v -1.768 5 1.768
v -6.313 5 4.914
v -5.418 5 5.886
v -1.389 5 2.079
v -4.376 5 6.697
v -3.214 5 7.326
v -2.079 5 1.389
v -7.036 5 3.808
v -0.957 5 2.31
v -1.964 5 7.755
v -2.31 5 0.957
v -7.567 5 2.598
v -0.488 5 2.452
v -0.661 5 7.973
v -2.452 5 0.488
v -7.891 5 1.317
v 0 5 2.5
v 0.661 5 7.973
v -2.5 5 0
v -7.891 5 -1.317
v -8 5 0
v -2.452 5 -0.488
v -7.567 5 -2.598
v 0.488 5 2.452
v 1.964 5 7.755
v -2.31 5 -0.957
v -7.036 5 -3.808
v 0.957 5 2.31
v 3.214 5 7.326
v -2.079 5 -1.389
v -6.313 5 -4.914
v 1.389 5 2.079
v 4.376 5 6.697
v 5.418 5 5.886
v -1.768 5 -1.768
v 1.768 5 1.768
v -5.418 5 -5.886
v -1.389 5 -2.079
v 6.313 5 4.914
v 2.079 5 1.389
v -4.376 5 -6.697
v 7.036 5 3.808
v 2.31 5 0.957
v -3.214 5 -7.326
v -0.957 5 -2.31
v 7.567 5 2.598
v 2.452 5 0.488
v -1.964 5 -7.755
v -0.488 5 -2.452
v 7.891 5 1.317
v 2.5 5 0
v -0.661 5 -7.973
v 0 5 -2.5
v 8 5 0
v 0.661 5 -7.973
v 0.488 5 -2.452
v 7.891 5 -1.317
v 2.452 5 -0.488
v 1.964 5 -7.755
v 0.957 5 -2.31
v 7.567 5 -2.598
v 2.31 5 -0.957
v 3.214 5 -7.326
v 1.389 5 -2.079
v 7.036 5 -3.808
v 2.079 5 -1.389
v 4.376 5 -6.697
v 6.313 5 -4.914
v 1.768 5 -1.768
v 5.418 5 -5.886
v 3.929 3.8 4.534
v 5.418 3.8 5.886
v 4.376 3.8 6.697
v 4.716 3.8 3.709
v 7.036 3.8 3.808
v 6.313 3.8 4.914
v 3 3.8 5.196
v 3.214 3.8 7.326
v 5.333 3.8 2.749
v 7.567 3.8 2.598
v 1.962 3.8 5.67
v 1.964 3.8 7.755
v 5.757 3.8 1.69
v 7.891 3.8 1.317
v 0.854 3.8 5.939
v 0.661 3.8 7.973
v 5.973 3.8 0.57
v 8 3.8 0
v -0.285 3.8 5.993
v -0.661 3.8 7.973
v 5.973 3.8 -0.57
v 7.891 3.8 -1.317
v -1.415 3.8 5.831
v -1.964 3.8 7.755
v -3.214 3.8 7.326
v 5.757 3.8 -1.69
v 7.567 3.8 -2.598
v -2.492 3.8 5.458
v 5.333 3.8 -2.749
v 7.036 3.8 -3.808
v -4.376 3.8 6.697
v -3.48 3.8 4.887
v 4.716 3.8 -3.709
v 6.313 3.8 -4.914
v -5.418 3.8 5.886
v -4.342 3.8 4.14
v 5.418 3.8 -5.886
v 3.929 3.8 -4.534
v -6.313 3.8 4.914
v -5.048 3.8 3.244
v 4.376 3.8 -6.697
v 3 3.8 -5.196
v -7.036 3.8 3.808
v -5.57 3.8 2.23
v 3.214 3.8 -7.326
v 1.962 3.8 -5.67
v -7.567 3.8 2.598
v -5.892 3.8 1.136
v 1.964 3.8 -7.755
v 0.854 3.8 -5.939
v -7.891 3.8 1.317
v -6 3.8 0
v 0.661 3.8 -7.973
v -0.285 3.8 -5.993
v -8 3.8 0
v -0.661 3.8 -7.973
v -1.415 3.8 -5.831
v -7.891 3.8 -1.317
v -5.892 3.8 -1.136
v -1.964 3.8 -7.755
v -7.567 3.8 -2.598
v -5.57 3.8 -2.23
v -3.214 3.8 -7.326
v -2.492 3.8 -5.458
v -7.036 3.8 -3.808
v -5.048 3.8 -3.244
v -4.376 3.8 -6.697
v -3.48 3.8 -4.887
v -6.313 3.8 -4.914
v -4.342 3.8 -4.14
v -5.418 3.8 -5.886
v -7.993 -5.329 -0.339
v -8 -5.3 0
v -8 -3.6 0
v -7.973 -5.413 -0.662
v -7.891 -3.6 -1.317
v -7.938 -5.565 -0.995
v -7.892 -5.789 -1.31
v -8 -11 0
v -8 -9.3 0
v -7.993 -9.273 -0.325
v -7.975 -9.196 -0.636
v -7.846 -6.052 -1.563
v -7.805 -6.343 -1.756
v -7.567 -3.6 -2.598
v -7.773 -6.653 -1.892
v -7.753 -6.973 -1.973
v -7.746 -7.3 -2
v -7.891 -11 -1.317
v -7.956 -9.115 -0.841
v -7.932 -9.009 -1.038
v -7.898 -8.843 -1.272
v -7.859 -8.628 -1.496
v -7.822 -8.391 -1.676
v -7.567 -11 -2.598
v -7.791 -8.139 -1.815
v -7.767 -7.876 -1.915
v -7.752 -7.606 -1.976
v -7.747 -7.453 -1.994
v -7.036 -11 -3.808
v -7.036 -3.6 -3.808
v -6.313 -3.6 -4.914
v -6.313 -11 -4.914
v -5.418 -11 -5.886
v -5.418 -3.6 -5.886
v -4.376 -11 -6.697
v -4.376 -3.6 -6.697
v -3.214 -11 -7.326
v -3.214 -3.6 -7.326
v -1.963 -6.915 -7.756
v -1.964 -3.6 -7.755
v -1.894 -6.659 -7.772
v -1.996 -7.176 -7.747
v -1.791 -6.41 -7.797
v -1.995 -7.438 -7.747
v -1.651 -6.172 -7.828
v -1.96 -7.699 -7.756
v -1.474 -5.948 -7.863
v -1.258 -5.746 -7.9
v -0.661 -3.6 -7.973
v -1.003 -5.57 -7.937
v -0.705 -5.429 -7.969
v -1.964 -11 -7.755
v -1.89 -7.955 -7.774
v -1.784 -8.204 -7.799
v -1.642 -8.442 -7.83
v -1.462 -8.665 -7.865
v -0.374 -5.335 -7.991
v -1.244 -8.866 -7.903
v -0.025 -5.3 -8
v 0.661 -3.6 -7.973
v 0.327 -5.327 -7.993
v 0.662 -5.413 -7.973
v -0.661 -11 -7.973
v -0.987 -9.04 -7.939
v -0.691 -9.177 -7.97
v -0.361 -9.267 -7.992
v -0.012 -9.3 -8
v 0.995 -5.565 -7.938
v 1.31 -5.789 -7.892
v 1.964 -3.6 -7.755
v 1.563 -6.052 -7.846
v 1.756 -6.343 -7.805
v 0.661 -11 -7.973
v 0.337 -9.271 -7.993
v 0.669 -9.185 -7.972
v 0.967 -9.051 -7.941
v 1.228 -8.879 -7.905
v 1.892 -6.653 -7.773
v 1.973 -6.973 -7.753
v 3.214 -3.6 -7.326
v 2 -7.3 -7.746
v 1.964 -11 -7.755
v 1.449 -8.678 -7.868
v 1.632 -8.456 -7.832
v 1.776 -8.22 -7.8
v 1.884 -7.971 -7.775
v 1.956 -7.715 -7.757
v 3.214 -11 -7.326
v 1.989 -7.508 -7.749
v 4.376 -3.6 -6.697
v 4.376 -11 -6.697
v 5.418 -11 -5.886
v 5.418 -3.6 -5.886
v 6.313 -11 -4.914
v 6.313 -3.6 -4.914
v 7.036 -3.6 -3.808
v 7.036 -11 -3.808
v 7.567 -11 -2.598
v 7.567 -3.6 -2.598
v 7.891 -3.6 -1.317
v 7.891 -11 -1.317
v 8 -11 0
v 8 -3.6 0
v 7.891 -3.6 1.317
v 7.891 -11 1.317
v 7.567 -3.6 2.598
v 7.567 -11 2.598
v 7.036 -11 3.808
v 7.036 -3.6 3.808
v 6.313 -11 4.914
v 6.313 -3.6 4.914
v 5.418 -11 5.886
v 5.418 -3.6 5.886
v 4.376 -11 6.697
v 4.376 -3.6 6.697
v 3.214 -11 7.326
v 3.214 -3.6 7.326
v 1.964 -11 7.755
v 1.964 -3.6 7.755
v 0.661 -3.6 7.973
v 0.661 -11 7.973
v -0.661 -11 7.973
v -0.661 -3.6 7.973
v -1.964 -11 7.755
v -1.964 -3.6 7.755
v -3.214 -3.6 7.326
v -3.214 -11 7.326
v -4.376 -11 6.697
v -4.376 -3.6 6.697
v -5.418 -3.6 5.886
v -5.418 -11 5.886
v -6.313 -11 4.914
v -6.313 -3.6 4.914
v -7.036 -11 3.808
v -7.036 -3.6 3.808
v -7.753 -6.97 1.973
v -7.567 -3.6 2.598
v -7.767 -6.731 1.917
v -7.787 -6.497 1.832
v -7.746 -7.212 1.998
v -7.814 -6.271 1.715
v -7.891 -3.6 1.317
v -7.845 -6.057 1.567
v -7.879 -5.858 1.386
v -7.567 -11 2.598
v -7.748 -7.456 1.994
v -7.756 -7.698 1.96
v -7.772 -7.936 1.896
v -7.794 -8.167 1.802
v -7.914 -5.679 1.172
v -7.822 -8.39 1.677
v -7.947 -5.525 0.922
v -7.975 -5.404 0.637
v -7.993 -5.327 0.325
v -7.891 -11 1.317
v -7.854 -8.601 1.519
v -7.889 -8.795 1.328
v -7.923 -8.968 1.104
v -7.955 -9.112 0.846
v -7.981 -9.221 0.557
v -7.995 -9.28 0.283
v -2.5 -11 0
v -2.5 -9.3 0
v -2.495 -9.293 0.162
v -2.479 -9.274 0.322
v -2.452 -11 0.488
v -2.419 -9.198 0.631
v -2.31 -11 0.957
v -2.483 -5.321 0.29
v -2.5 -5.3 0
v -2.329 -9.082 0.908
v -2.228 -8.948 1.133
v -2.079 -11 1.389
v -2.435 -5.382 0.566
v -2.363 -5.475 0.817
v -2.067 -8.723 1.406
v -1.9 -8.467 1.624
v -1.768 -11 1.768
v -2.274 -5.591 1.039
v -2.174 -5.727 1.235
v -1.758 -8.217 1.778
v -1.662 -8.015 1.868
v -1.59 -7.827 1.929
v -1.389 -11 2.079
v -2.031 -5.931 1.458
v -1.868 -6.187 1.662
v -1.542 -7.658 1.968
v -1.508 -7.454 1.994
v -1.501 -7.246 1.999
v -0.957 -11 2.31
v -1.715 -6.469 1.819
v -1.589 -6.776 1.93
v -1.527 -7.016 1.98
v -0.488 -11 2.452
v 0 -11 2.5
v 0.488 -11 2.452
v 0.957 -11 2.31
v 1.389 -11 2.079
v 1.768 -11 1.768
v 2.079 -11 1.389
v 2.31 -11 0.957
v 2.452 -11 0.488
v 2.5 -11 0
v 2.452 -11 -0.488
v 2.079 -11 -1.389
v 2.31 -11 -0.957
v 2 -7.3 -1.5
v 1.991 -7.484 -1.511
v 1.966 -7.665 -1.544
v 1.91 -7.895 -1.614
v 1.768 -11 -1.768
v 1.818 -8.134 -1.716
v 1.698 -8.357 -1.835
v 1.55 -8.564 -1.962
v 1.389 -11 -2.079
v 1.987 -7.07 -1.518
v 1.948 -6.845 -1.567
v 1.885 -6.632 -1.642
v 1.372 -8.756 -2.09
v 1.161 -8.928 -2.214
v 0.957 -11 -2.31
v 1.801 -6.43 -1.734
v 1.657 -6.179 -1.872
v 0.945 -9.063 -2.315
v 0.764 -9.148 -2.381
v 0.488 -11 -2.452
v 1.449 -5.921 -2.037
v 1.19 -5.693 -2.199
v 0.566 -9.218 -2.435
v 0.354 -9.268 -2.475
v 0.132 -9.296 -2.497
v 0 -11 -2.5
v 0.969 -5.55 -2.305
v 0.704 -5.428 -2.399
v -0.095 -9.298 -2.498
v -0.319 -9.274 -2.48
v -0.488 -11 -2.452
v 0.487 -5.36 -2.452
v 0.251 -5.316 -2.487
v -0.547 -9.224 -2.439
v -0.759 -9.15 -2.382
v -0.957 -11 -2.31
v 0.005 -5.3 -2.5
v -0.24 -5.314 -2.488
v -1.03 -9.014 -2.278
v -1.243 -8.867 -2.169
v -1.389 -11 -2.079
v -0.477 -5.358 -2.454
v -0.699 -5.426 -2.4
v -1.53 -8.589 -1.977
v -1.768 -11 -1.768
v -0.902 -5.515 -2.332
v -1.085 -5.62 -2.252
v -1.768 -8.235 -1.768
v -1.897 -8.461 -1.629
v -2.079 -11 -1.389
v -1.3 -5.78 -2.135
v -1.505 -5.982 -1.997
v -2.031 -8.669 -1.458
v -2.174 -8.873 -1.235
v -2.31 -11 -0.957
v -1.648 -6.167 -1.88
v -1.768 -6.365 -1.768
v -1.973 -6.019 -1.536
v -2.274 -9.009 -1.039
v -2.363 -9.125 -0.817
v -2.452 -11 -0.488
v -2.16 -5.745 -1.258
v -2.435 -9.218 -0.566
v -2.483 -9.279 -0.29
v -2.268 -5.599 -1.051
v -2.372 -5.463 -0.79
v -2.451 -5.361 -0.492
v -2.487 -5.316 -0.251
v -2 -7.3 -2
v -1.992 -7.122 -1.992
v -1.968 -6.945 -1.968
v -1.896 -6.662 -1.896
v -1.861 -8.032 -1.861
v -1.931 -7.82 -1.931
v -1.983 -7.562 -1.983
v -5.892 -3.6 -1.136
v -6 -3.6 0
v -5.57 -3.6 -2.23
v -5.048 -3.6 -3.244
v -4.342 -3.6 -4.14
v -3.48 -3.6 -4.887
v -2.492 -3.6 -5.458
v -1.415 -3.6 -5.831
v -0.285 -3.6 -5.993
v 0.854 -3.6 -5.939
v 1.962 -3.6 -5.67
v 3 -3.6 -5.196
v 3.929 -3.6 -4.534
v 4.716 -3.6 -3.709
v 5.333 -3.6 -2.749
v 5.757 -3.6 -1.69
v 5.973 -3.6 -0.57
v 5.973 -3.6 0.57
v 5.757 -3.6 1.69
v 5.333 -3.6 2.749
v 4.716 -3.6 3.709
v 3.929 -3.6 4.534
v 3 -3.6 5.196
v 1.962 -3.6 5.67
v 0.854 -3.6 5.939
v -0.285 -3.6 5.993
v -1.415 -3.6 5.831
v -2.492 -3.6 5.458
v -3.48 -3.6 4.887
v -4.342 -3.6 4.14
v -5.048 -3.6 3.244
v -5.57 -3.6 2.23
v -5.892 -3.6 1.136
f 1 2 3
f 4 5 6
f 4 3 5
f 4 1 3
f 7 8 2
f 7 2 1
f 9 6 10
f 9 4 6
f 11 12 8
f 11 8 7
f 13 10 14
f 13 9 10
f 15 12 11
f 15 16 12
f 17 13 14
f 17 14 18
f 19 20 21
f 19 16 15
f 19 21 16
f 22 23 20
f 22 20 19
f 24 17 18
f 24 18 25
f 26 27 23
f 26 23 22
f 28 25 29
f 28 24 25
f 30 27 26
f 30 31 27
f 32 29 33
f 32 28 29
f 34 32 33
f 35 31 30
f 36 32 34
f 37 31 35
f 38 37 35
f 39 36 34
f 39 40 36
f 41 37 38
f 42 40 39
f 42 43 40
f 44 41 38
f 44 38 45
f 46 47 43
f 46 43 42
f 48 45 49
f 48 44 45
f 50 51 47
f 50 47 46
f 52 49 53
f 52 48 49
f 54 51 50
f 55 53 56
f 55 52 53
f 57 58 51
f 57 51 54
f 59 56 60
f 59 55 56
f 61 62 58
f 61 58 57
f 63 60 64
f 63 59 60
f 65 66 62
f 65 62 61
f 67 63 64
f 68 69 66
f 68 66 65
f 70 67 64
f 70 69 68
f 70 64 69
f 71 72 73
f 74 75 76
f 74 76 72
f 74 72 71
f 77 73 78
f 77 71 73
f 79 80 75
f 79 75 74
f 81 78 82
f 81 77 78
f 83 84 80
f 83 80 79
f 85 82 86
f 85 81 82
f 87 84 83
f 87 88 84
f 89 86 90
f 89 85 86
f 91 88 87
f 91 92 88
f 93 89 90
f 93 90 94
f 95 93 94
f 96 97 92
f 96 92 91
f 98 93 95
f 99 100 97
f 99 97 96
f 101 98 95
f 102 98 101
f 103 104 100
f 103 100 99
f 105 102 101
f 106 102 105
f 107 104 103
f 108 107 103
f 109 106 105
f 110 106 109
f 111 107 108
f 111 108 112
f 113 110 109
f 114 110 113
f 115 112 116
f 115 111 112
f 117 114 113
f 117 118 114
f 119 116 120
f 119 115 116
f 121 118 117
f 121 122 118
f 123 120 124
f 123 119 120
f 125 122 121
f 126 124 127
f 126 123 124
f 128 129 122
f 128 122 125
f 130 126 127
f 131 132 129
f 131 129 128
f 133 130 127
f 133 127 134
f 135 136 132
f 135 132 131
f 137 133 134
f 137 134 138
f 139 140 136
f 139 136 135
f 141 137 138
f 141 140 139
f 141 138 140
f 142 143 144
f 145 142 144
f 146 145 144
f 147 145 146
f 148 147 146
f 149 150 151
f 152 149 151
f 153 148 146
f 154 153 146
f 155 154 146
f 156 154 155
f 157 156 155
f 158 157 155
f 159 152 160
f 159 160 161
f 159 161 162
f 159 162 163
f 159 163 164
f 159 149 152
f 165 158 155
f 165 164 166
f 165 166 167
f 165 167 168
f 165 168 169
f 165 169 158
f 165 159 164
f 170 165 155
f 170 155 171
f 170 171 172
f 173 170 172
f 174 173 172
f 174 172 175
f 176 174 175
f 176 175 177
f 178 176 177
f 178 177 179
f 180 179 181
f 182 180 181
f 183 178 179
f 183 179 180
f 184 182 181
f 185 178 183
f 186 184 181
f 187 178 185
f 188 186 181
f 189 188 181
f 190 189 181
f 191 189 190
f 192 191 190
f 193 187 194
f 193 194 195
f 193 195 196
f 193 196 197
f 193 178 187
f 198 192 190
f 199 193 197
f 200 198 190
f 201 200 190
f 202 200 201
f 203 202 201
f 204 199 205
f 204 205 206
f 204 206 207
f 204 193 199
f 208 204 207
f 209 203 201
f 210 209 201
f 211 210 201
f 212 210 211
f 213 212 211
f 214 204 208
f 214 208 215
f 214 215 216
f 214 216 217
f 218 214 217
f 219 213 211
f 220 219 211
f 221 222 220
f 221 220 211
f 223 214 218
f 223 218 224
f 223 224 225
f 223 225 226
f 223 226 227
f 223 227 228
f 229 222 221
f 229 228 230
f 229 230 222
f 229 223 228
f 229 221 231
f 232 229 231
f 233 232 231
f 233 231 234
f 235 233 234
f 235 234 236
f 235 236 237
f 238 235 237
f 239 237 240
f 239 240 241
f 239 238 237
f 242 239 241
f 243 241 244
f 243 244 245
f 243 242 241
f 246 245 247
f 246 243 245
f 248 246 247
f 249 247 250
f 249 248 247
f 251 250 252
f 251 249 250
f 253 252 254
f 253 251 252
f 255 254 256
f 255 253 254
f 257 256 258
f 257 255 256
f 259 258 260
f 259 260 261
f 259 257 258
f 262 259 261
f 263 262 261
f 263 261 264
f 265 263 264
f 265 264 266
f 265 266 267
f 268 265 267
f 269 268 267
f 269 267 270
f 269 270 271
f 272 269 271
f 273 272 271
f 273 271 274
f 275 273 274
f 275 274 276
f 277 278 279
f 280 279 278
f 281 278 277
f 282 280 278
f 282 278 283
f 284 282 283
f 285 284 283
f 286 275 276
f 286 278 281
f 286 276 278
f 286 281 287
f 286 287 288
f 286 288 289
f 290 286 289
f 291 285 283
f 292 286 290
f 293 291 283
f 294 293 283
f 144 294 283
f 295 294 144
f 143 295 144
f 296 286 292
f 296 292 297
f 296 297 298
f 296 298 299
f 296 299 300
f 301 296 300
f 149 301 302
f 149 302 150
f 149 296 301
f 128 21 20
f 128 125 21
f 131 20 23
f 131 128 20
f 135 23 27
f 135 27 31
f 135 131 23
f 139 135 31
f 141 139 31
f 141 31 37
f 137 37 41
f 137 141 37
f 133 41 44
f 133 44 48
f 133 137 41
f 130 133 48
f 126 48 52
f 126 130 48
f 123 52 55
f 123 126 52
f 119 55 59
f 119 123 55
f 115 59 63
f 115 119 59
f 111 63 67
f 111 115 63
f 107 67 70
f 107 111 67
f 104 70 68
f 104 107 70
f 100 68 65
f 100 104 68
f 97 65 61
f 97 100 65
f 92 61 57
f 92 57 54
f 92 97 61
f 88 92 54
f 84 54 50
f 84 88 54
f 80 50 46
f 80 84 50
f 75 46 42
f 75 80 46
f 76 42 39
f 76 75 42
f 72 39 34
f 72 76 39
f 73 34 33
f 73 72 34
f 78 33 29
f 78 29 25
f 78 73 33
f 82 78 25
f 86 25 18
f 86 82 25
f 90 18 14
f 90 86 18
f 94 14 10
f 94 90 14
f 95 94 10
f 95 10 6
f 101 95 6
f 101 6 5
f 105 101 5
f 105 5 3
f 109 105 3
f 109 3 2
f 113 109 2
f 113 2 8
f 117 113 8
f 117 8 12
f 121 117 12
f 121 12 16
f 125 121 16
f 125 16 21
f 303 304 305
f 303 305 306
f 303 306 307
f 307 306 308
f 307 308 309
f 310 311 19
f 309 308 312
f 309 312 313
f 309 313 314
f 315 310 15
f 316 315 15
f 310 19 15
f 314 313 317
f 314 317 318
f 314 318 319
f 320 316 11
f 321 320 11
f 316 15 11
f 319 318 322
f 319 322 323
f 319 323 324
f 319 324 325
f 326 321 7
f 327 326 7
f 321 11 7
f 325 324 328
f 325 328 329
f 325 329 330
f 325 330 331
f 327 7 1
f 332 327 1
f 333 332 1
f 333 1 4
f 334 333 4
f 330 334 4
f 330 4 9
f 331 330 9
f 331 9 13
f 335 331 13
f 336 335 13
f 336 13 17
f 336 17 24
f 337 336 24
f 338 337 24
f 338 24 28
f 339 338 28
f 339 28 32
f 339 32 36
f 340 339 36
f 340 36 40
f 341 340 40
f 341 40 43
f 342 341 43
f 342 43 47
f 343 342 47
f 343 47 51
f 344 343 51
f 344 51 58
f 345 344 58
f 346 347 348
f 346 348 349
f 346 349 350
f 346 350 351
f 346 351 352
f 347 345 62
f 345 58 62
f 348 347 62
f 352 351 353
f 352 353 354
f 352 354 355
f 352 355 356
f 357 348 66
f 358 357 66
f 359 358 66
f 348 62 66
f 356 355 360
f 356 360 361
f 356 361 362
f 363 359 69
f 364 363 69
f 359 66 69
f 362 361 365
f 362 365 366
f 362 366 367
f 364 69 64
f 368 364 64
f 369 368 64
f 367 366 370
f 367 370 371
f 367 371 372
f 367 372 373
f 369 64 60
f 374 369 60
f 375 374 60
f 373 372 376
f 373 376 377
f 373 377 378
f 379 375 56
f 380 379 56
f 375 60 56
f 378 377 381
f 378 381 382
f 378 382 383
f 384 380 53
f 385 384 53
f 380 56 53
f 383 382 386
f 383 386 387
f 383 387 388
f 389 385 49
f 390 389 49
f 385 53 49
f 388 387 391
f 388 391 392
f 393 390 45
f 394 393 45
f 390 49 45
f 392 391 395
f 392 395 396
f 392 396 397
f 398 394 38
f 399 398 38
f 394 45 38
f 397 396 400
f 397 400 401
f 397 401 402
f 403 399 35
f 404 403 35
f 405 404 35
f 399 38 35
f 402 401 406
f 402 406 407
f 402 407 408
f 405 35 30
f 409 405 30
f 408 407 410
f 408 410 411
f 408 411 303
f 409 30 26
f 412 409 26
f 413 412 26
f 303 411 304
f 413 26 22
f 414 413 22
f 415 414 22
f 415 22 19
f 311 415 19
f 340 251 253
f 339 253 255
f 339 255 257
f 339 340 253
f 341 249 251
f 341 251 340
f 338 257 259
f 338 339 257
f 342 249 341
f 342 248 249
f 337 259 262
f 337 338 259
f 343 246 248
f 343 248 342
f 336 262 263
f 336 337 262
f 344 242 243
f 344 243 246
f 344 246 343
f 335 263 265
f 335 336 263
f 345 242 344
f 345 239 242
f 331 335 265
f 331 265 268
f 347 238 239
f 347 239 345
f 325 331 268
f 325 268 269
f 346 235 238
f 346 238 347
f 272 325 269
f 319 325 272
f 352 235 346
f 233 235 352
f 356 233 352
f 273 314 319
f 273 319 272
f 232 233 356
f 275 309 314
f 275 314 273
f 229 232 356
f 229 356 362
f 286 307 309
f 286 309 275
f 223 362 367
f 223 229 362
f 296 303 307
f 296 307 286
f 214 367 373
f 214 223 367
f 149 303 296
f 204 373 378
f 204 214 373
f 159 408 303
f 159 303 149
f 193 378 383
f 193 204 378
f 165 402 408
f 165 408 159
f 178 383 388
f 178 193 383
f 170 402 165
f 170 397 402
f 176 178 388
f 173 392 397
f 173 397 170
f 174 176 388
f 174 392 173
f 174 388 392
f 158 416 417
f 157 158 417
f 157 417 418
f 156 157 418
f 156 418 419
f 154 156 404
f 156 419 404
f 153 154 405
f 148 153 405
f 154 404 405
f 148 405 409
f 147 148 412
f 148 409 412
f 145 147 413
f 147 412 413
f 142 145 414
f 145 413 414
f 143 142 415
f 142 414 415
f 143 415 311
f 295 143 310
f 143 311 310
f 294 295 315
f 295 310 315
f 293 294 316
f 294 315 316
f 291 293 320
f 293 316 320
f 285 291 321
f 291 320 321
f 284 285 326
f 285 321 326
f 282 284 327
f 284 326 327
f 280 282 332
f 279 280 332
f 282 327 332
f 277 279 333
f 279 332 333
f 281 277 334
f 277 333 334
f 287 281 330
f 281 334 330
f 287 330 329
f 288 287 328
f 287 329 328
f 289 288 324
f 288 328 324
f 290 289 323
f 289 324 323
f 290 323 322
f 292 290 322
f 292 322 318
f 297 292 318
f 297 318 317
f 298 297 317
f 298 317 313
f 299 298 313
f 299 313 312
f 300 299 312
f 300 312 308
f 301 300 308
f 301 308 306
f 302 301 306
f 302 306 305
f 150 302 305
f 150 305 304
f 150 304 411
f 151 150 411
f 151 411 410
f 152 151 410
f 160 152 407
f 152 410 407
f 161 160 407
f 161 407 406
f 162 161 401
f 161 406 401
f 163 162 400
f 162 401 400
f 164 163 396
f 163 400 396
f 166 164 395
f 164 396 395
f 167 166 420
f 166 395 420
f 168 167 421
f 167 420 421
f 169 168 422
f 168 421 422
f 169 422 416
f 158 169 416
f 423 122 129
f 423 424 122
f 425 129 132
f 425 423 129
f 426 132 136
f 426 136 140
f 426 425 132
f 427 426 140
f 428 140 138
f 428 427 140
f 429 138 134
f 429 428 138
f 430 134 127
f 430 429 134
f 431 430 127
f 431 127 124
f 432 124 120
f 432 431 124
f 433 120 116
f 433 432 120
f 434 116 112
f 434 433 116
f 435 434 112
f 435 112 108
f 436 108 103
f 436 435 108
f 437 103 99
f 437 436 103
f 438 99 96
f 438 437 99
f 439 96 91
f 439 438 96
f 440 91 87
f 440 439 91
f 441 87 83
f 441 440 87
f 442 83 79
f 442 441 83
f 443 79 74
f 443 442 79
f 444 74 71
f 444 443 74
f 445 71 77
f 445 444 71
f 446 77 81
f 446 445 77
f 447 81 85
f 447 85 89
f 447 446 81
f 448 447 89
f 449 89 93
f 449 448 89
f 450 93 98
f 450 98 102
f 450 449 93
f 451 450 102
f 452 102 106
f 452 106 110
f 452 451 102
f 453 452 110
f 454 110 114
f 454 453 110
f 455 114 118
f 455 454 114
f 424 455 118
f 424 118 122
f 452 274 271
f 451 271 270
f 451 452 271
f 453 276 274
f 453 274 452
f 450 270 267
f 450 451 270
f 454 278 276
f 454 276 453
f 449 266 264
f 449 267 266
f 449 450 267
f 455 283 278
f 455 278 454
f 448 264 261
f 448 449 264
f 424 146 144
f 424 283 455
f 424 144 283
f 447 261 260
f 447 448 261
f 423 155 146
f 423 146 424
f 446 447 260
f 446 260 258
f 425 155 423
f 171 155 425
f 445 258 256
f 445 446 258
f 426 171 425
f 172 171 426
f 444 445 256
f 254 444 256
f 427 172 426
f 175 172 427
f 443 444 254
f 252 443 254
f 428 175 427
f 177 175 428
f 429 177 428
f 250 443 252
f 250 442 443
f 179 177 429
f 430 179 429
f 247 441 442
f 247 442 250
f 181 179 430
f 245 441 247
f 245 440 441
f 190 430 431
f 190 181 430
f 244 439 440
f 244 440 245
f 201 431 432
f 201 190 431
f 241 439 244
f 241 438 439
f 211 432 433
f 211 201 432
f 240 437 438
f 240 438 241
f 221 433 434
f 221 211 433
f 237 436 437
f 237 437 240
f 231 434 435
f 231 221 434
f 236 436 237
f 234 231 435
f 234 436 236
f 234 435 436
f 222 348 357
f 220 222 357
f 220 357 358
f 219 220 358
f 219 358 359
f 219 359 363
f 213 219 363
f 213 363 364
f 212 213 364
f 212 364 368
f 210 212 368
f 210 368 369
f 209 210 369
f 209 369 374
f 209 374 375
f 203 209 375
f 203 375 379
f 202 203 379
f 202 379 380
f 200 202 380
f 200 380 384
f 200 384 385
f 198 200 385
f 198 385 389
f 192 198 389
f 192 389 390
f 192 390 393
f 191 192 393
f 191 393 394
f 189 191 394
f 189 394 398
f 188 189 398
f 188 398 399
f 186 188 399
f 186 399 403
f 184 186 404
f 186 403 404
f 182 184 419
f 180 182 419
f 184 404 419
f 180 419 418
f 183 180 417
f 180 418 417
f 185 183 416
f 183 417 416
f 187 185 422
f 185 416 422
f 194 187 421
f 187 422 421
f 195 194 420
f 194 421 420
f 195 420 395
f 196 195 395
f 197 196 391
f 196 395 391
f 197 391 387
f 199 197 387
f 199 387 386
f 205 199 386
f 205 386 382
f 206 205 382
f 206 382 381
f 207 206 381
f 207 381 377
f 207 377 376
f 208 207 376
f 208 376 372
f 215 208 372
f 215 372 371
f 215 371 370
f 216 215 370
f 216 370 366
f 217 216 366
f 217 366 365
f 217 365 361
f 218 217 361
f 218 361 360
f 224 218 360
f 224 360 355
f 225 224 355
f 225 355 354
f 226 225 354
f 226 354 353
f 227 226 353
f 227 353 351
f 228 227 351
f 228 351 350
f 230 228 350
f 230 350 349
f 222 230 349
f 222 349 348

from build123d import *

# Parameters (mm, degrees)
CUT_EXTRUDE1_REACH      = 21.596
SKETCH2_R               = 2.5
CUT_EXTRUDE2_REACH      = 17.78
CUT_EXTRUDE2_END_RADIUS = 8
SKETCH3_R               = 2
CIRPATTERN1_COUNT       = 2
CIRPATTERN1_ANGLE       = 90


with BuildPart() as part:
    # Sketch1 → Revolve1 (revolve)
    with BuildSketch(Plane.XY):
        Polygon((0, 5), (-8, 5), (-8, 3.8), (-6, 3.8), (-6, -3.6), (-8, -3.6), (-8, -11), (0, -11), align=None)
    revolve(axis=Axis((0, 1004.776363636, 0), (0, -1, 0)))

    # Sketch2 → Cut-Extrude1 (cut, up to next)
    with BuildSketch(Plane(origin=(0, 5, 0), x_dir=(1, 0, 0), z_dir=(0, 1, 0)), mode=Mode.PRIVATE) as cut_extrude1_sk1:
        with Locations(Location((0, 0, 0), (0, 0, 180))):
            Circle(SKETCH2_R)
    cut_extrude1_tool1 = extrude(cut_extrude1_sk1.sketch, amount=-CUT_EXTRUDE1_REACH, mode=Mode.PRIVATE) & part.part
    add(cut_extrude1_tool1.solids().sort_by_distance((0, 5, 0))[0], mode=Mode.SUBTRACT)

    # Cut-Extrude2: up to this cylinder (the profile starts inside it)
    cut_extrude2_end = Plane(origin=(0, -7.3, 0), z_dir=(0, 1, 0)) * Cylinder(CUT_EXTRUDE2_END_RADIUS, 52.56, mode=Mode.PRIVATE)
    # Sketch3 → Cut-Extrude2 (cut, up to the surface)
    with BuildSketch(Plane.XY, mode=Mode.PRIVATE) as cut_extrude2_sk1:
        with Locations((0, -7.3)):
            Circle(SKETCH3_R)
    cut_extrude2_tool1 = extrude(cut_extrude2_sk1.sketch, amount=-CUT_EXTRUDE2_REACH, mode=Mode.PRIVATE) & cut_extrude2_end
    cut_extrude2 = cut_extrude2_tool1.solids().sort_by_distance((0, -7.3, 0))[0]
    add(cut_extrude2, mode=Mode.SUBTRACT)

    # CirPattern1: Cut-Extrude2 ×2 about axis
    cirpattern1_axis = Axis((0, -11, 0), (0, 1, 0))
    for i in range(1, CIRPATTERN1_COUNT):
        add(cut_extrude2.rotate(cirpattern1_axis, i * CIRPATTERN1_ANGLE / (CIRPATTERN1_COUNT - 1)), mode=Mode.SUBTRACT)


solid = part.part
